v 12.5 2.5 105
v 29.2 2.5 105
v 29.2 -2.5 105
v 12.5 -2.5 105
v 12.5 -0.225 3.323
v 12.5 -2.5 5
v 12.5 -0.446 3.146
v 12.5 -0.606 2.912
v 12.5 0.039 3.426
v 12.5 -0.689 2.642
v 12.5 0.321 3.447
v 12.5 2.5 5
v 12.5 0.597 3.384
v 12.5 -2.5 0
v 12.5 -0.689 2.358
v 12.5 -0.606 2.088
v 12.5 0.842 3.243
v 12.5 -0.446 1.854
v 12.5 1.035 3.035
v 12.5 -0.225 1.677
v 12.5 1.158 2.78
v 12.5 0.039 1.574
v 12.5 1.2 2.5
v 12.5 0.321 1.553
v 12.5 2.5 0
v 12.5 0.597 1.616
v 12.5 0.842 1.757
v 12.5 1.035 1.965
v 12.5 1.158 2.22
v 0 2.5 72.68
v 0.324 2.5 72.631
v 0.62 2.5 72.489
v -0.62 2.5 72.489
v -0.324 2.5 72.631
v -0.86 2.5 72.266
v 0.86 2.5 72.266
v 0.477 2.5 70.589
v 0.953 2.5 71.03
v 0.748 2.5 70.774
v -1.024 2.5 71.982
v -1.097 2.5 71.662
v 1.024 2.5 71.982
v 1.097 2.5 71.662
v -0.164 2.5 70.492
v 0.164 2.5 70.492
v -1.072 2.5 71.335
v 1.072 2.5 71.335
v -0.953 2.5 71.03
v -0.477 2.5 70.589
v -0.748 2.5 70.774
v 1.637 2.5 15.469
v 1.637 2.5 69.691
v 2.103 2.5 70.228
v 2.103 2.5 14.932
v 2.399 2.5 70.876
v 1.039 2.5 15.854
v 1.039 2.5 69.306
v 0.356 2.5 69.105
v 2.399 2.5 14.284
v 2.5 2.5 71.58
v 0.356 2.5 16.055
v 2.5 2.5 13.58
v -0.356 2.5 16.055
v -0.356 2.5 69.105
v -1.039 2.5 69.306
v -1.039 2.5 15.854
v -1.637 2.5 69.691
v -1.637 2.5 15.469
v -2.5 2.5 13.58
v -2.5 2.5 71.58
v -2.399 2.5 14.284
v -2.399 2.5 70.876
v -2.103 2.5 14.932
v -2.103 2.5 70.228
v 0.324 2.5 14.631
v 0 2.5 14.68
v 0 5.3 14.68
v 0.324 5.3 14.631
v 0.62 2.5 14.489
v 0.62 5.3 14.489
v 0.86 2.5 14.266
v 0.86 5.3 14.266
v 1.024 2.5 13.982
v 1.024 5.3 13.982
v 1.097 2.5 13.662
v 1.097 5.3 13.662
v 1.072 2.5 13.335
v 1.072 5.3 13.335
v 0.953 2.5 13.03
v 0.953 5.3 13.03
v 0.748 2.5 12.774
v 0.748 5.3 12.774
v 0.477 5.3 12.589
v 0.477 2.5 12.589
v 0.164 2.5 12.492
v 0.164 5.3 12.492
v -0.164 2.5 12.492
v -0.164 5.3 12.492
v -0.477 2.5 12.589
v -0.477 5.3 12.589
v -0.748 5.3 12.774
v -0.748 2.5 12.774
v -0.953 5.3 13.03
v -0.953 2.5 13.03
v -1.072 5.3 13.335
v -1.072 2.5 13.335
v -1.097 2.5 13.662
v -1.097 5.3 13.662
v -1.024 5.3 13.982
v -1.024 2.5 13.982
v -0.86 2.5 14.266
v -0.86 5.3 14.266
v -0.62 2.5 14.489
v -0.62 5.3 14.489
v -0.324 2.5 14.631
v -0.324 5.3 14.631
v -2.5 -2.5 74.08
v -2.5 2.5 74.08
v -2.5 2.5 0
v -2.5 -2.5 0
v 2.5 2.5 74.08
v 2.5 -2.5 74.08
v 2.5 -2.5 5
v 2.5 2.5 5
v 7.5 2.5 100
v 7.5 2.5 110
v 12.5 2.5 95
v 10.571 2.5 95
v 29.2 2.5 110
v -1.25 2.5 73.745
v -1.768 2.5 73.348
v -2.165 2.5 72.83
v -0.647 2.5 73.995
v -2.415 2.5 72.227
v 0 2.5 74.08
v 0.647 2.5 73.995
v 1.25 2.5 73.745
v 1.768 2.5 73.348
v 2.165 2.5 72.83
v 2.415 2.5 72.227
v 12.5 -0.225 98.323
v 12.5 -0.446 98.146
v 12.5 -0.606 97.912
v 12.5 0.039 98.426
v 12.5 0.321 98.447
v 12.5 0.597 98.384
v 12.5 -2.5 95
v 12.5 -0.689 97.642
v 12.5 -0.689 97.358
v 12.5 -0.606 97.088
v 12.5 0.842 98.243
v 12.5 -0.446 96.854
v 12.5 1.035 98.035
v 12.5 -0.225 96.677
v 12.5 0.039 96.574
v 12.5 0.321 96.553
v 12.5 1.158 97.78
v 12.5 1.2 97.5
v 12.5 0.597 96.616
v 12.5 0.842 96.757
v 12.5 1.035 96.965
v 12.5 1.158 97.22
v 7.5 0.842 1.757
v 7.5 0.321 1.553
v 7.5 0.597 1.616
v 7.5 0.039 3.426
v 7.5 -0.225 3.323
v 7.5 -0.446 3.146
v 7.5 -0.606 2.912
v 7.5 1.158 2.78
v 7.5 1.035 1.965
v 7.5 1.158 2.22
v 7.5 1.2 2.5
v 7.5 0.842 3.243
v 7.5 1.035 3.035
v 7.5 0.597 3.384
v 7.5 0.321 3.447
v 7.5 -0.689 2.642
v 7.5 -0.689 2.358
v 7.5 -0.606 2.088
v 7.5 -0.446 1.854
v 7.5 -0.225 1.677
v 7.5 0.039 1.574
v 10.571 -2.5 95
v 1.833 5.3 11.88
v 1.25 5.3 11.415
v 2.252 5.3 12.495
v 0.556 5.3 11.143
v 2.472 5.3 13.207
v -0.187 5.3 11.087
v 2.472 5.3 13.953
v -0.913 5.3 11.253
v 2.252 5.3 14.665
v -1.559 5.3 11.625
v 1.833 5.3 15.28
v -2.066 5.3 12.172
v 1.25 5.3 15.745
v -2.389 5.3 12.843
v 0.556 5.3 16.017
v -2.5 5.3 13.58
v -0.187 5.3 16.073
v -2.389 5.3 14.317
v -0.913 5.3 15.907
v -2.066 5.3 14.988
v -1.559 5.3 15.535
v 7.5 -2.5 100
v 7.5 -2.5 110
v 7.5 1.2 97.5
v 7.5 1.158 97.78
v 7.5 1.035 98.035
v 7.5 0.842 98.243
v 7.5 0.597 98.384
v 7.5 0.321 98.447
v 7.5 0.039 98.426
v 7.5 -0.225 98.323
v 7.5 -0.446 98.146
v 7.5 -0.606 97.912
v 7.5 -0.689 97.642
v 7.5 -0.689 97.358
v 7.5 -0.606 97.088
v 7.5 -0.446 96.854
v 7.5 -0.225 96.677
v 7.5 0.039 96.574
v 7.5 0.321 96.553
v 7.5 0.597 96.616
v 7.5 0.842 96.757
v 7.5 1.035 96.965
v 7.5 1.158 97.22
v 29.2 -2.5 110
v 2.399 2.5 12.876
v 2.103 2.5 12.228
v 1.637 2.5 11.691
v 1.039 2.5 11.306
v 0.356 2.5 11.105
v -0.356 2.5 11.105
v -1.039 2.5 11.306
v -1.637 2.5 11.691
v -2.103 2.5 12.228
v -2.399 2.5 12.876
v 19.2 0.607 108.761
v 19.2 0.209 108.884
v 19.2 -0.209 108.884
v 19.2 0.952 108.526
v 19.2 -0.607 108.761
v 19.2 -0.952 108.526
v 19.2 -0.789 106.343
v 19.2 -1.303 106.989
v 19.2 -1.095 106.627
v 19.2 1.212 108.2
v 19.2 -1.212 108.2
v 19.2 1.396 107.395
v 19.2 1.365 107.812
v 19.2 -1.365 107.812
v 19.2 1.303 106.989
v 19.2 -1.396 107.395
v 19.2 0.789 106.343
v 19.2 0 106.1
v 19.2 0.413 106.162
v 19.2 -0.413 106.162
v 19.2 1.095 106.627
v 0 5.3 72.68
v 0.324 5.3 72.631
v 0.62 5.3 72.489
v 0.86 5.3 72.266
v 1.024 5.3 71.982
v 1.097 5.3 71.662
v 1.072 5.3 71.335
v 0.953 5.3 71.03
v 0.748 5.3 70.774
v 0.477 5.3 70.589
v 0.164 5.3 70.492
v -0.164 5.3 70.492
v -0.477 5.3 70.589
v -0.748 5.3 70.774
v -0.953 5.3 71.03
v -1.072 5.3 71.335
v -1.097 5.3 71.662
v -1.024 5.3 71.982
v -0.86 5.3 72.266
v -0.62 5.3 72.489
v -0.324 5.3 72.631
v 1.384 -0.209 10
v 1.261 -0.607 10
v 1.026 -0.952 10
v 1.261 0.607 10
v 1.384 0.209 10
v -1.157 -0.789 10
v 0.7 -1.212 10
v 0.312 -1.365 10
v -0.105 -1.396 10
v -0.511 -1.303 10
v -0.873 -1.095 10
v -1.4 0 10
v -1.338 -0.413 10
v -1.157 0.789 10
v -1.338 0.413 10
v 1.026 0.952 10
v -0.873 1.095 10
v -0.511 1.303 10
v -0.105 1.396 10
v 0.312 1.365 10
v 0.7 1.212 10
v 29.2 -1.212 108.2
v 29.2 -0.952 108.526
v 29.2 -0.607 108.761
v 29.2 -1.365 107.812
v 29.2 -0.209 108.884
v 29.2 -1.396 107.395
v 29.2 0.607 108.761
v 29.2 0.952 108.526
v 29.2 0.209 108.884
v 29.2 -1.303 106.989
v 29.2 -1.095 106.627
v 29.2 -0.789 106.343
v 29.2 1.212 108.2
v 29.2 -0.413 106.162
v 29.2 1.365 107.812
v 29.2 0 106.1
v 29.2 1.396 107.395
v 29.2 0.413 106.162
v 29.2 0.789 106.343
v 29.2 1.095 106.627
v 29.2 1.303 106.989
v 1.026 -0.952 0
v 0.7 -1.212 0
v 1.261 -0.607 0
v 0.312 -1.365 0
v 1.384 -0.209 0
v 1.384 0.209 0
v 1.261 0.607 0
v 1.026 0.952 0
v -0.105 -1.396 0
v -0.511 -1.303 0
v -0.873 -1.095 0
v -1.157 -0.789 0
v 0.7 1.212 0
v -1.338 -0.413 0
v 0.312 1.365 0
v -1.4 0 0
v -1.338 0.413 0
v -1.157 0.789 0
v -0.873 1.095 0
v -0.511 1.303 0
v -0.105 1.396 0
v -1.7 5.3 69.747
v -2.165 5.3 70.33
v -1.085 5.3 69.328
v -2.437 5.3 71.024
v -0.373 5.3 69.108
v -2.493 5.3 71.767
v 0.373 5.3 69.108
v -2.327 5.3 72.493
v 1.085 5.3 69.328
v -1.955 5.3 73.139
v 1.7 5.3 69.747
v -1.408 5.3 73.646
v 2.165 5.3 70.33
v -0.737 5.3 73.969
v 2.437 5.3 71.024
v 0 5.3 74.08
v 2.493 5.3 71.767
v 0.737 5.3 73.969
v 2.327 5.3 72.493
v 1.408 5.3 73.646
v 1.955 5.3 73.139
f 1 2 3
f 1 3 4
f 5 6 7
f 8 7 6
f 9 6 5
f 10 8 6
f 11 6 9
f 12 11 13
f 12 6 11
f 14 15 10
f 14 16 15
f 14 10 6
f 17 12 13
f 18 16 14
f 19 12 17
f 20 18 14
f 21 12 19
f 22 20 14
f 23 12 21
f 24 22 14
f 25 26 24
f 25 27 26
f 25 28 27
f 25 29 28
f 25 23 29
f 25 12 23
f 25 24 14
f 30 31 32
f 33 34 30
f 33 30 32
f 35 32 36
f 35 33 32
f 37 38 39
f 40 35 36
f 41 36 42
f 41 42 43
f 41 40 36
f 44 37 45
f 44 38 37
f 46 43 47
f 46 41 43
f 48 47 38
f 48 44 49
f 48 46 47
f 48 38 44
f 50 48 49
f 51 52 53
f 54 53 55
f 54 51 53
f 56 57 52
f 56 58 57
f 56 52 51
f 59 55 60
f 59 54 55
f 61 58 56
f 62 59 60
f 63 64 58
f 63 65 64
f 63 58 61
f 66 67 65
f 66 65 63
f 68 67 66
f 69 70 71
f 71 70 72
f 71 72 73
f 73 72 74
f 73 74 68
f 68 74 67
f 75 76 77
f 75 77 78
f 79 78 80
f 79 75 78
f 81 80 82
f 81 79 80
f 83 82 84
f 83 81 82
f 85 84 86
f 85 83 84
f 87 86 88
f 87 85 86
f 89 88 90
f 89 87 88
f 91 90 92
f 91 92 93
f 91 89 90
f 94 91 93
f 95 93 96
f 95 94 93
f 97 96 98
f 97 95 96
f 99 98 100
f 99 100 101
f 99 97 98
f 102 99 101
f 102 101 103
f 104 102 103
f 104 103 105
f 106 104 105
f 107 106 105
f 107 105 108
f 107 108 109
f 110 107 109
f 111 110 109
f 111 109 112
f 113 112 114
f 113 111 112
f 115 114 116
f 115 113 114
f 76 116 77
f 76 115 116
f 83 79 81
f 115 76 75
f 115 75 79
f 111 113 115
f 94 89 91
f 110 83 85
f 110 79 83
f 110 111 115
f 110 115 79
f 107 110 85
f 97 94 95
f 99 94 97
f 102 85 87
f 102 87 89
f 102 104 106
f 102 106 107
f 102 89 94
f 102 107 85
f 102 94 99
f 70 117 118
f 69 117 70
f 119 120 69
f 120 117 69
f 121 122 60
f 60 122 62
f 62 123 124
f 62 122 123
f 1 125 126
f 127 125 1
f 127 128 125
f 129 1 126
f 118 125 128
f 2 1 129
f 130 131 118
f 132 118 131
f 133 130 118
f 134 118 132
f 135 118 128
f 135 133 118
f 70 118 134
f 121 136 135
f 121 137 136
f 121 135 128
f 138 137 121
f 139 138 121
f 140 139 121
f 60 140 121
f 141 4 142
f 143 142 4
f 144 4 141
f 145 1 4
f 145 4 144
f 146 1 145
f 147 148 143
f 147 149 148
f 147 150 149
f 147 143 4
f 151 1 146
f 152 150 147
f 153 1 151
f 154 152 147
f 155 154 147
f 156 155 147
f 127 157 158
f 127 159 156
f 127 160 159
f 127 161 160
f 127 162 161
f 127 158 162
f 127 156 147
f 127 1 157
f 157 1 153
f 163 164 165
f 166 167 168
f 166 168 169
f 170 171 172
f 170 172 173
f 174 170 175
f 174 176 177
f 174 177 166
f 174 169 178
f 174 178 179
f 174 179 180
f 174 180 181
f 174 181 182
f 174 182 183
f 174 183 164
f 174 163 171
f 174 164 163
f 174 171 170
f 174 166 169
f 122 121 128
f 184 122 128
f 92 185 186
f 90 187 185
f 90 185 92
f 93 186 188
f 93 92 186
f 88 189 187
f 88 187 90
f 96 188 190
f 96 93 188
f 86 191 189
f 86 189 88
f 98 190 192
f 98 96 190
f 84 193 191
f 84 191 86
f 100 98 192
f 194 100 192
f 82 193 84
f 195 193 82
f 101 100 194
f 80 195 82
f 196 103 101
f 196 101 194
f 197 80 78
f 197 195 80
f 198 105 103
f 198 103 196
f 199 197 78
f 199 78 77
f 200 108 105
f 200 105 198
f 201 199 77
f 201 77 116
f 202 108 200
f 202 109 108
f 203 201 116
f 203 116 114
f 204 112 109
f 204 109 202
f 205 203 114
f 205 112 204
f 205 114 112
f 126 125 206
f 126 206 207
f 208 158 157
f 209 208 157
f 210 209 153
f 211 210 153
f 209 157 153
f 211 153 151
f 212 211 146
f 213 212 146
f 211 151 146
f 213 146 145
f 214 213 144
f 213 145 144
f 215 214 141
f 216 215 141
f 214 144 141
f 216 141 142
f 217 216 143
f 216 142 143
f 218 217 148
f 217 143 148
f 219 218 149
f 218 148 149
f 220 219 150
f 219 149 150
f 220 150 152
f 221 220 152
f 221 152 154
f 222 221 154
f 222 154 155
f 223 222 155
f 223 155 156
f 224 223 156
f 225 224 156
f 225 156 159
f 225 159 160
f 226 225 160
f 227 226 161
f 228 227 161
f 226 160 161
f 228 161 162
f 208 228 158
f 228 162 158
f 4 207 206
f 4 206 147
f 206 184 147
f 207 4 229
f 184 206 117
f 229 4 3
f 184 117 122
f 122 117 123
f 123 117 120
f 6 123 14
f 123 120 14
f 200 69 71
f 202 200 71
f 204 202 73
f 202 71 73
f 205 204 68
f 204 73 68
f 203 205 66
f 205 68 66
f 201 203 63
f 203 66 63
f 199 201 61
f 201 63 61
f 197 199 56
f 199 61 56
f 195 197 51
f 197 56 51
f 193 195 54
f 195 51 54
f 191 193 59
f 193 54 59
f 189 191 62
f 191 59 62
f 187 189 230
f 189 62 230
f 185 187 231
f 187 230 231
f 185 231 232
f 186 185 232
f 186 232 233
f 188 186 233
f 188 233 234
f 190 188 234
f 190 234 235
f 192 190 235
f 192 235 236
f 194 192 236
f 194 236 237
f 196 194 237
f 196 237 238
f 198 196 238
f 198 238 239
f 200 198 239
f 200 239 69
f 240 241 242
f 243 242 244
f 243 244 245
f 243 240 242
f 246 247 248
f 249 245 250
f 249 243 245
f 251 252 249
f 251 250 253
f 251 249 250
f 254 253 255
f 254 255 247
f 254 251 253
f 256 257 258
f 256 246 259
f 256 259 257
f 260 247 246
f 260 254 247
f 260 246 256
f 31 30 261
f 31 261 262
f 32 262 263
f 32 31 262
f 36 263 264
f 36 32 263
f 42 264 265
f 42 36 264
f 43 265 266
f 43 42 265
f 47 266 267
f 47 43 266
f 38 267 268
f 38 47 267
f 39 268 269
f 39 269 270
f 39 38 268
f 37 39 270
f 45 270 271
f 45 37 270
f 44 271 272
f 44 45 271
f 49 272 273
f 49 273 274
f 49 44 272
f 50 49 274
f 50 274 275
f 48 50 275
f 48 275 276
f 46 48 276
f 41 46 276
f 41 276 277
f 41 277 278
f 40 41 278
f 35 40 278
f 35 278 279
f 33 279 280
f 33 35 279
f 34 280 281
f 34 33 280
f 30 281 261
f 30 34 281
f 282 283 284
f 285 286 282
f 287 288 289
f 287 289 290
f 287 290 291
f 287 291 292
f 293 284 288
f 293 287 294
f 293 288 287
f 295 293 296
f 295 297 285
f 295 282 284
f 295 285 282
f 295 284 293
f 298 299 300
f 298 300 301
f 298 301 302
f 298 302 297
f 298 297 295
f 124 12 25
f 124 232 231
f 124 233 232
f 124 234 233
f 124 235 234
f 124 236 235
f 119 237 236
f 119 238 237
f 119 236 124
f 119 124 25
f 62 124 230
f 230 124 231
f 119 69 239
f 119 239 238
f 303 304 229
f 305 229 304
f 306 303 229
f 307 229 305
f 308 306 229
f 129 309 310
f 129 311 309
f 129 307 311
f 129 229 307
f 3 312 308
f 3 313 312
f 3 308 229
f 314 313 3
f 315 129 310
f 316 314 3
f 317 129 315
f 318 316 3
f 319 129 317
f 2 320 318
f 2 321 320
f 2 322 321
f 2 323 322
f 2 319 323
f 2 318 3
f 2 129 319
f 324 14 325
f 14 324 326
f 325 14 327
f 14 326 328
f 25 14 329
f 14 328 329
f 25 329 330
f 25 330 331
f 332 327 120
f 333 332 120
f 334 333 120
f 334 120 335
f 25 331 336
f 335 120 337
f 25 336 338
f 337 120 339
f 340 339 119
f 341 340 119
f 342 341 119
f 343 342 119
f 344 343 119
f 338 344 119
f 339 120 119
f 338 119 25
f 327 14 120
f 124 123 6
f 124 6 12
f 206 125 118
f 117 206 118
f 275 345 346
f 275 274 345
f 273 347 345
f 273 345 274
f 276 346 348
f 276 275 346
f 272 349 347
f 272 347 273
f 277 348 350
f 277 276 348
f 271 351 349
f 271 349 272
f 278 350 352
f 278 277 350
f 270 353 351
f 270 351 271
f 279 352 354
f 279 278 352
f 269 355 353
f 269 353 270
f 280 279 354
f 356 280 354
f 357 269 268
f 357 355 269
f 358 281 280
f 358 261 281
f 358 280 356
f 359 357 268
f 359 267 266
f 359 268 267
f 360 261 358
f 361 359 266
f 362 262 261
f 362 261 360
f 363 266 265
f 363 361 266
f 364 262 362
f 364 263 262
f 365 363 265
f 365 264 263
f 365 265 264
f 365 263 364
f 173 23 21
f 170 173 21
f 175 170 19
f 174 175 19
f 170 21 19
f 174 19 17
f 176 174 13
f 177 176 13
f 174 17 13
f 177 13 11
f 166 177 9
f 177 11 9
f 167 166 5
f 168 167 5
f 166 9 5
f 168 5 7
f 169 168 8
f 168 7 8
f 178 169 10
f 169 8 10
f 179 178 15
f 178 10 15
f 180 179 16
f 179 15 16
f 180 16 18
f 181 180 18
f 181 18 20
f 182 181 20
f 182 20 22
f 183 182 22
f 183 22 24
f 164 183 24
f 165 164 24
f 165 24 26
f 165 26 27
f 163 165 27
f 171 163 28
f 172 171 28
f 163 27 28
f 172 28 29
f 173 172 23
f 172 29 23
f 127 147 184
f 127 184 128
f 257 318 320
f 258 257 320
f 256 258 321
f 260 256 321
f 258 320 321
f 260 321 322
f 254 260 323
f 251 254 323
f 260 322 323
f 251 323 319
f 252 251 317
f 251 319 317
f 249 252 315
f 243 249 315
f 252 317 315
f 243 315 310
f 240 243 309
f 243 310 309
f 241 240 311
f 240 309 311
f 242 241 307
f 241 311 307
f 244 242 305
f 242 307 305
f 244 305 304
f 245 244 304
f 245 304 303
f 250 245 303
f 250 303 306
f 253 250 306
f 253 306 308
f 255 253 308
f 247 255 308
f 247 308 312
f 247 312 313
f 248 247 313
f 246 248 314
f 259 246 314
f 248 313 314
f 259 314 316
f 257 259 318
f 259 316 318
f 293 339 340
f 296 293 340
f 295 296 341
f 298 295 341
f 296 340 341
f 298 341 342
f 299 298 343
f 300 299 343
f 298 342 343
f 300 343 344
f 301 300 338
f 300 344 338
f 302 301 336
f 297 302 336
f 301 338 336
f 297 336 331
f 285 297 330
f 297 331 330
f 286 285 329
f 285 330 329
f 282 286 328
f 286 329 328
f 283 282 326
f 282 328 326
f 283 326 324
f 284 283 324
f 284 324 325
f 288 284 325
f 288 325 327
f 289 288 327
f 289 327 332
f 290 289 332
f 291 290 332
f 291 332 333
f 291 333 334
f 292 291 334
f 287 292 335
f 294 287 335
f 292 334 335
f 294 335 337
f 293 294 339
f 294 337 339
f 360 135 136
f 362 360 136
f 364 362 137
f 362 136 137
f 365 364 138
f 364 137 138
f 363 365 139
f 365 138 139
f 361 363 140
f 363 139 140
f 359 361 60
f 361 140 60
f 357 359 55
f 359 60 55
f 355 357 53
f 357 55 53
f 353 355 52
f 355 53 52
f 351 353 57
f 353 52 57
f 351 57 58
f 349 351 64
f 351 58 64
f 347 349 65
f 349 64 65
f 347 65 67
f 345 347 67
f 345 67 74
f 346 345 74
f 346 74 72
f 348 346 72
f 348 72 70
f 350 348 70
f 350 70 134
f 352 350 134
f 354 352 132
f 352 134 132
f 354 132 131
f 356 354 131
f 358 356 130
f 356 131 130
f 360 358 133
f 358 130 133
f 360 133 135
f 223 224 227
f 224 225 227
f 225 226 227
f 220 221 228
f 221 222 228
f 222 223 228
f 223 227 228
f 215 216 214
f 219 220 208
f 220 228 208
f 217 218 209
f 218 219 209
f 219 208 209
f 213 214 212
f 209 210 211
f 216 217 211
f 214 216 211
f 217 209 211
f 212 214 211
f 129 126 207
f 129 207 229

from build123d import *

# Parameters (mm, degrees)
SKETCH1_W           = 5
SKETCH1_H           = 5
BOSS_EXTRUDE1_DEPTH = 74.08
SKETCH2_R           = 1.4
CUT_EXTRUDE1_DEPTH  = 10
SKETCH3_W           = 5
SKETCH3_H           = 5
BOSS_EXTRUDE2_DEPTH = 10
SKETCH4_R           = 0.95
CUT_EXTRUDE2_DEPTH  = 5
SKETCH5_R           = 2.5
SKETCH5_R_2         = 1.1
BOSS_EXTRUDE3_DEPTH = 2.8
SKETCH6_W           = 5
SKETCH6_H           = 5
SKETCH6_R           = 0.95
BOSS_EXTRUDE4_DEPTH = 5
BOSS_EXTRUDE5_DEPTH = 5
BOSS_EXTRUDE6_START = 2.5
BOSS_EXTRUDE6_DEPTH = 5
SKETCH9_R           = 1.4
CUT_EXTRUDE3_DEPTH  = 10


with BuildPart() as part:
    # Sketch1 → Boss-Extrude1 (new body)
    with BuildSketch(Plane.XY):
        Rectangle(SKETCH1_W, SKETCH1_H)
    extrude(amount=BOSS_EXTRUDE1_DEPTH)

    # Sketch2 → Cut-Extrude1 (cut)
    with BuildSketch(Plane(origin=(0, 0, 0), x_dir=(-1, 0, 0), z_dir=(0, 0, -1))):
        Circle(SKETCH2_R)
    extrude(amount=-CUT_EXTRUDE1_DEPTH, mode=Mode.SUBTRACT)

    # Sketch3 → Boss-Extrude2 (add)
    with BuildSketch(Plane(origin=(2.5, 0, 0), x_dir=(0, 0, -1), z_dir=(1, 0, 0))):
        with Locations((-2.5, 0)):
            Rectangle(SKETCH3_W, SKETCH3_H)
    extrude(amount=BOSS_EXTRUDE2_DEPTH)

    # Sketch4 → Cut-Extrude2 (cut)
    with BuildSketch(Plane(origin=(12.5, 0, 0), x_dir=(0, 0, -1), z_dir=(1, 0, 0))):
        with Locations(Location((-2.5, 0.25, 0), (0, 0, 90))):
            Circle(SKETCH4_R)
    extrude(amount=-CUT_EXTRUDE2_DEPTH, mode=Mode.SUBTRACT)

    # Sketch5 → Boss-Extrude3 (add)
    # profile 1 of 2: a face of its own
    with BuildSketch(Plane(origin=(0, 2.5, 0), x_dir=(1, 0, 0), z_dir=(0, 1, 0))):
        with Locations(Location((0, -13.58, 0), (0, 0, 180))):
            Circle(SKETCH5_R)
        with Locations(Location((0, -13.58, 0), (0, 0, 270))):
            Circle(SKETCH5_R_2, mode=Mode.SUBTRACT)
    # profile 2 of 2: a face of its own
    with BuildSketch(Plane(origin=(0, 2.5, 0), x_dir=(1, 0, 0), z_dir=(0, 1, 0))):
        with Locations(Location((0, -71.58, 0), (0, 0, 270))):
            Circle(SKETCH5_R)
        with Locations(Location((0, -71.58, 0), (0, 0, 270))):
            Circle(SKETCH5_R_2, mode=Mode.SUBTRACT)
    extrude(amount=BOSS_EXTRUDE3_DEPTH)



with BuildPart() as body_2:
    # Sketch6 → Boss-Extrude4 (new body)
    with BuildSketch(Plane(origin=(12.5, 0, 0), x_dir=(0, 0, -1), z_dir=(1, 0, 0))):
        with Locations((-97.5, 0)):
            Rectangle(SKETCH6_W, SKETCH6_H)
        with Locations(Location((-97.5, 0.25, 0), (0, 0, 90))):
            Circle(SKETCH6_R, mode=Mode.SUBTRACT)
    extrude(amount=-BOSS_EXTRUDE4_DEPTH)


with BuildPart() as part_1:
    add(part.part)

    add(body_2.part)  # Boss-Extrude5 merges body 2
    # Sketch7 → Boss-Extrude5 (add)
    with BuildSketch(Plane(origin=(0, 2.5, 0), x_dir=(1, 0, 0), z_dir=(0, 1, 0))):
        Polygon((7.5, -100), (-2.5, -74.08), (2.5, -74.08), (10.570987654, -95), (7.5, -95), align=None)
    extrude(amount=-BOSS_EXTRUDE5_DEPTH)

    # Sketch8 → Boss-Extrude6 (add)
    with BuildSketch(Plane(origin=(0, 0, 0), x_dir=(1, 0, 0), z_dir=(0, 1, 0)).offset(BOSS_EXTRUDE6_START)):
        Polygon((7.5, -100), (7.5, -110), (29.2, -110), (29.2, -105), (12.5, -105), (12.5, -100), align=None)
    extrude(amount=-BOSS_EXTRUDE6_DEPTH)

    # Sketch9 → Cut-Extrude3 (cut)
    with BuildSketch(Plane(origin=(29.2, 0, 0), x_dir=(0, 0, -1), z_dir=(1, 0, 0))):
        with Locations((-107.5, 0)):
            Circle(SKETCH9_R)
    extrude(amount=-CUT_EXTRUDE3_DEPTH, mode=Mode.SUBTRACT)


solid = part_1.part
